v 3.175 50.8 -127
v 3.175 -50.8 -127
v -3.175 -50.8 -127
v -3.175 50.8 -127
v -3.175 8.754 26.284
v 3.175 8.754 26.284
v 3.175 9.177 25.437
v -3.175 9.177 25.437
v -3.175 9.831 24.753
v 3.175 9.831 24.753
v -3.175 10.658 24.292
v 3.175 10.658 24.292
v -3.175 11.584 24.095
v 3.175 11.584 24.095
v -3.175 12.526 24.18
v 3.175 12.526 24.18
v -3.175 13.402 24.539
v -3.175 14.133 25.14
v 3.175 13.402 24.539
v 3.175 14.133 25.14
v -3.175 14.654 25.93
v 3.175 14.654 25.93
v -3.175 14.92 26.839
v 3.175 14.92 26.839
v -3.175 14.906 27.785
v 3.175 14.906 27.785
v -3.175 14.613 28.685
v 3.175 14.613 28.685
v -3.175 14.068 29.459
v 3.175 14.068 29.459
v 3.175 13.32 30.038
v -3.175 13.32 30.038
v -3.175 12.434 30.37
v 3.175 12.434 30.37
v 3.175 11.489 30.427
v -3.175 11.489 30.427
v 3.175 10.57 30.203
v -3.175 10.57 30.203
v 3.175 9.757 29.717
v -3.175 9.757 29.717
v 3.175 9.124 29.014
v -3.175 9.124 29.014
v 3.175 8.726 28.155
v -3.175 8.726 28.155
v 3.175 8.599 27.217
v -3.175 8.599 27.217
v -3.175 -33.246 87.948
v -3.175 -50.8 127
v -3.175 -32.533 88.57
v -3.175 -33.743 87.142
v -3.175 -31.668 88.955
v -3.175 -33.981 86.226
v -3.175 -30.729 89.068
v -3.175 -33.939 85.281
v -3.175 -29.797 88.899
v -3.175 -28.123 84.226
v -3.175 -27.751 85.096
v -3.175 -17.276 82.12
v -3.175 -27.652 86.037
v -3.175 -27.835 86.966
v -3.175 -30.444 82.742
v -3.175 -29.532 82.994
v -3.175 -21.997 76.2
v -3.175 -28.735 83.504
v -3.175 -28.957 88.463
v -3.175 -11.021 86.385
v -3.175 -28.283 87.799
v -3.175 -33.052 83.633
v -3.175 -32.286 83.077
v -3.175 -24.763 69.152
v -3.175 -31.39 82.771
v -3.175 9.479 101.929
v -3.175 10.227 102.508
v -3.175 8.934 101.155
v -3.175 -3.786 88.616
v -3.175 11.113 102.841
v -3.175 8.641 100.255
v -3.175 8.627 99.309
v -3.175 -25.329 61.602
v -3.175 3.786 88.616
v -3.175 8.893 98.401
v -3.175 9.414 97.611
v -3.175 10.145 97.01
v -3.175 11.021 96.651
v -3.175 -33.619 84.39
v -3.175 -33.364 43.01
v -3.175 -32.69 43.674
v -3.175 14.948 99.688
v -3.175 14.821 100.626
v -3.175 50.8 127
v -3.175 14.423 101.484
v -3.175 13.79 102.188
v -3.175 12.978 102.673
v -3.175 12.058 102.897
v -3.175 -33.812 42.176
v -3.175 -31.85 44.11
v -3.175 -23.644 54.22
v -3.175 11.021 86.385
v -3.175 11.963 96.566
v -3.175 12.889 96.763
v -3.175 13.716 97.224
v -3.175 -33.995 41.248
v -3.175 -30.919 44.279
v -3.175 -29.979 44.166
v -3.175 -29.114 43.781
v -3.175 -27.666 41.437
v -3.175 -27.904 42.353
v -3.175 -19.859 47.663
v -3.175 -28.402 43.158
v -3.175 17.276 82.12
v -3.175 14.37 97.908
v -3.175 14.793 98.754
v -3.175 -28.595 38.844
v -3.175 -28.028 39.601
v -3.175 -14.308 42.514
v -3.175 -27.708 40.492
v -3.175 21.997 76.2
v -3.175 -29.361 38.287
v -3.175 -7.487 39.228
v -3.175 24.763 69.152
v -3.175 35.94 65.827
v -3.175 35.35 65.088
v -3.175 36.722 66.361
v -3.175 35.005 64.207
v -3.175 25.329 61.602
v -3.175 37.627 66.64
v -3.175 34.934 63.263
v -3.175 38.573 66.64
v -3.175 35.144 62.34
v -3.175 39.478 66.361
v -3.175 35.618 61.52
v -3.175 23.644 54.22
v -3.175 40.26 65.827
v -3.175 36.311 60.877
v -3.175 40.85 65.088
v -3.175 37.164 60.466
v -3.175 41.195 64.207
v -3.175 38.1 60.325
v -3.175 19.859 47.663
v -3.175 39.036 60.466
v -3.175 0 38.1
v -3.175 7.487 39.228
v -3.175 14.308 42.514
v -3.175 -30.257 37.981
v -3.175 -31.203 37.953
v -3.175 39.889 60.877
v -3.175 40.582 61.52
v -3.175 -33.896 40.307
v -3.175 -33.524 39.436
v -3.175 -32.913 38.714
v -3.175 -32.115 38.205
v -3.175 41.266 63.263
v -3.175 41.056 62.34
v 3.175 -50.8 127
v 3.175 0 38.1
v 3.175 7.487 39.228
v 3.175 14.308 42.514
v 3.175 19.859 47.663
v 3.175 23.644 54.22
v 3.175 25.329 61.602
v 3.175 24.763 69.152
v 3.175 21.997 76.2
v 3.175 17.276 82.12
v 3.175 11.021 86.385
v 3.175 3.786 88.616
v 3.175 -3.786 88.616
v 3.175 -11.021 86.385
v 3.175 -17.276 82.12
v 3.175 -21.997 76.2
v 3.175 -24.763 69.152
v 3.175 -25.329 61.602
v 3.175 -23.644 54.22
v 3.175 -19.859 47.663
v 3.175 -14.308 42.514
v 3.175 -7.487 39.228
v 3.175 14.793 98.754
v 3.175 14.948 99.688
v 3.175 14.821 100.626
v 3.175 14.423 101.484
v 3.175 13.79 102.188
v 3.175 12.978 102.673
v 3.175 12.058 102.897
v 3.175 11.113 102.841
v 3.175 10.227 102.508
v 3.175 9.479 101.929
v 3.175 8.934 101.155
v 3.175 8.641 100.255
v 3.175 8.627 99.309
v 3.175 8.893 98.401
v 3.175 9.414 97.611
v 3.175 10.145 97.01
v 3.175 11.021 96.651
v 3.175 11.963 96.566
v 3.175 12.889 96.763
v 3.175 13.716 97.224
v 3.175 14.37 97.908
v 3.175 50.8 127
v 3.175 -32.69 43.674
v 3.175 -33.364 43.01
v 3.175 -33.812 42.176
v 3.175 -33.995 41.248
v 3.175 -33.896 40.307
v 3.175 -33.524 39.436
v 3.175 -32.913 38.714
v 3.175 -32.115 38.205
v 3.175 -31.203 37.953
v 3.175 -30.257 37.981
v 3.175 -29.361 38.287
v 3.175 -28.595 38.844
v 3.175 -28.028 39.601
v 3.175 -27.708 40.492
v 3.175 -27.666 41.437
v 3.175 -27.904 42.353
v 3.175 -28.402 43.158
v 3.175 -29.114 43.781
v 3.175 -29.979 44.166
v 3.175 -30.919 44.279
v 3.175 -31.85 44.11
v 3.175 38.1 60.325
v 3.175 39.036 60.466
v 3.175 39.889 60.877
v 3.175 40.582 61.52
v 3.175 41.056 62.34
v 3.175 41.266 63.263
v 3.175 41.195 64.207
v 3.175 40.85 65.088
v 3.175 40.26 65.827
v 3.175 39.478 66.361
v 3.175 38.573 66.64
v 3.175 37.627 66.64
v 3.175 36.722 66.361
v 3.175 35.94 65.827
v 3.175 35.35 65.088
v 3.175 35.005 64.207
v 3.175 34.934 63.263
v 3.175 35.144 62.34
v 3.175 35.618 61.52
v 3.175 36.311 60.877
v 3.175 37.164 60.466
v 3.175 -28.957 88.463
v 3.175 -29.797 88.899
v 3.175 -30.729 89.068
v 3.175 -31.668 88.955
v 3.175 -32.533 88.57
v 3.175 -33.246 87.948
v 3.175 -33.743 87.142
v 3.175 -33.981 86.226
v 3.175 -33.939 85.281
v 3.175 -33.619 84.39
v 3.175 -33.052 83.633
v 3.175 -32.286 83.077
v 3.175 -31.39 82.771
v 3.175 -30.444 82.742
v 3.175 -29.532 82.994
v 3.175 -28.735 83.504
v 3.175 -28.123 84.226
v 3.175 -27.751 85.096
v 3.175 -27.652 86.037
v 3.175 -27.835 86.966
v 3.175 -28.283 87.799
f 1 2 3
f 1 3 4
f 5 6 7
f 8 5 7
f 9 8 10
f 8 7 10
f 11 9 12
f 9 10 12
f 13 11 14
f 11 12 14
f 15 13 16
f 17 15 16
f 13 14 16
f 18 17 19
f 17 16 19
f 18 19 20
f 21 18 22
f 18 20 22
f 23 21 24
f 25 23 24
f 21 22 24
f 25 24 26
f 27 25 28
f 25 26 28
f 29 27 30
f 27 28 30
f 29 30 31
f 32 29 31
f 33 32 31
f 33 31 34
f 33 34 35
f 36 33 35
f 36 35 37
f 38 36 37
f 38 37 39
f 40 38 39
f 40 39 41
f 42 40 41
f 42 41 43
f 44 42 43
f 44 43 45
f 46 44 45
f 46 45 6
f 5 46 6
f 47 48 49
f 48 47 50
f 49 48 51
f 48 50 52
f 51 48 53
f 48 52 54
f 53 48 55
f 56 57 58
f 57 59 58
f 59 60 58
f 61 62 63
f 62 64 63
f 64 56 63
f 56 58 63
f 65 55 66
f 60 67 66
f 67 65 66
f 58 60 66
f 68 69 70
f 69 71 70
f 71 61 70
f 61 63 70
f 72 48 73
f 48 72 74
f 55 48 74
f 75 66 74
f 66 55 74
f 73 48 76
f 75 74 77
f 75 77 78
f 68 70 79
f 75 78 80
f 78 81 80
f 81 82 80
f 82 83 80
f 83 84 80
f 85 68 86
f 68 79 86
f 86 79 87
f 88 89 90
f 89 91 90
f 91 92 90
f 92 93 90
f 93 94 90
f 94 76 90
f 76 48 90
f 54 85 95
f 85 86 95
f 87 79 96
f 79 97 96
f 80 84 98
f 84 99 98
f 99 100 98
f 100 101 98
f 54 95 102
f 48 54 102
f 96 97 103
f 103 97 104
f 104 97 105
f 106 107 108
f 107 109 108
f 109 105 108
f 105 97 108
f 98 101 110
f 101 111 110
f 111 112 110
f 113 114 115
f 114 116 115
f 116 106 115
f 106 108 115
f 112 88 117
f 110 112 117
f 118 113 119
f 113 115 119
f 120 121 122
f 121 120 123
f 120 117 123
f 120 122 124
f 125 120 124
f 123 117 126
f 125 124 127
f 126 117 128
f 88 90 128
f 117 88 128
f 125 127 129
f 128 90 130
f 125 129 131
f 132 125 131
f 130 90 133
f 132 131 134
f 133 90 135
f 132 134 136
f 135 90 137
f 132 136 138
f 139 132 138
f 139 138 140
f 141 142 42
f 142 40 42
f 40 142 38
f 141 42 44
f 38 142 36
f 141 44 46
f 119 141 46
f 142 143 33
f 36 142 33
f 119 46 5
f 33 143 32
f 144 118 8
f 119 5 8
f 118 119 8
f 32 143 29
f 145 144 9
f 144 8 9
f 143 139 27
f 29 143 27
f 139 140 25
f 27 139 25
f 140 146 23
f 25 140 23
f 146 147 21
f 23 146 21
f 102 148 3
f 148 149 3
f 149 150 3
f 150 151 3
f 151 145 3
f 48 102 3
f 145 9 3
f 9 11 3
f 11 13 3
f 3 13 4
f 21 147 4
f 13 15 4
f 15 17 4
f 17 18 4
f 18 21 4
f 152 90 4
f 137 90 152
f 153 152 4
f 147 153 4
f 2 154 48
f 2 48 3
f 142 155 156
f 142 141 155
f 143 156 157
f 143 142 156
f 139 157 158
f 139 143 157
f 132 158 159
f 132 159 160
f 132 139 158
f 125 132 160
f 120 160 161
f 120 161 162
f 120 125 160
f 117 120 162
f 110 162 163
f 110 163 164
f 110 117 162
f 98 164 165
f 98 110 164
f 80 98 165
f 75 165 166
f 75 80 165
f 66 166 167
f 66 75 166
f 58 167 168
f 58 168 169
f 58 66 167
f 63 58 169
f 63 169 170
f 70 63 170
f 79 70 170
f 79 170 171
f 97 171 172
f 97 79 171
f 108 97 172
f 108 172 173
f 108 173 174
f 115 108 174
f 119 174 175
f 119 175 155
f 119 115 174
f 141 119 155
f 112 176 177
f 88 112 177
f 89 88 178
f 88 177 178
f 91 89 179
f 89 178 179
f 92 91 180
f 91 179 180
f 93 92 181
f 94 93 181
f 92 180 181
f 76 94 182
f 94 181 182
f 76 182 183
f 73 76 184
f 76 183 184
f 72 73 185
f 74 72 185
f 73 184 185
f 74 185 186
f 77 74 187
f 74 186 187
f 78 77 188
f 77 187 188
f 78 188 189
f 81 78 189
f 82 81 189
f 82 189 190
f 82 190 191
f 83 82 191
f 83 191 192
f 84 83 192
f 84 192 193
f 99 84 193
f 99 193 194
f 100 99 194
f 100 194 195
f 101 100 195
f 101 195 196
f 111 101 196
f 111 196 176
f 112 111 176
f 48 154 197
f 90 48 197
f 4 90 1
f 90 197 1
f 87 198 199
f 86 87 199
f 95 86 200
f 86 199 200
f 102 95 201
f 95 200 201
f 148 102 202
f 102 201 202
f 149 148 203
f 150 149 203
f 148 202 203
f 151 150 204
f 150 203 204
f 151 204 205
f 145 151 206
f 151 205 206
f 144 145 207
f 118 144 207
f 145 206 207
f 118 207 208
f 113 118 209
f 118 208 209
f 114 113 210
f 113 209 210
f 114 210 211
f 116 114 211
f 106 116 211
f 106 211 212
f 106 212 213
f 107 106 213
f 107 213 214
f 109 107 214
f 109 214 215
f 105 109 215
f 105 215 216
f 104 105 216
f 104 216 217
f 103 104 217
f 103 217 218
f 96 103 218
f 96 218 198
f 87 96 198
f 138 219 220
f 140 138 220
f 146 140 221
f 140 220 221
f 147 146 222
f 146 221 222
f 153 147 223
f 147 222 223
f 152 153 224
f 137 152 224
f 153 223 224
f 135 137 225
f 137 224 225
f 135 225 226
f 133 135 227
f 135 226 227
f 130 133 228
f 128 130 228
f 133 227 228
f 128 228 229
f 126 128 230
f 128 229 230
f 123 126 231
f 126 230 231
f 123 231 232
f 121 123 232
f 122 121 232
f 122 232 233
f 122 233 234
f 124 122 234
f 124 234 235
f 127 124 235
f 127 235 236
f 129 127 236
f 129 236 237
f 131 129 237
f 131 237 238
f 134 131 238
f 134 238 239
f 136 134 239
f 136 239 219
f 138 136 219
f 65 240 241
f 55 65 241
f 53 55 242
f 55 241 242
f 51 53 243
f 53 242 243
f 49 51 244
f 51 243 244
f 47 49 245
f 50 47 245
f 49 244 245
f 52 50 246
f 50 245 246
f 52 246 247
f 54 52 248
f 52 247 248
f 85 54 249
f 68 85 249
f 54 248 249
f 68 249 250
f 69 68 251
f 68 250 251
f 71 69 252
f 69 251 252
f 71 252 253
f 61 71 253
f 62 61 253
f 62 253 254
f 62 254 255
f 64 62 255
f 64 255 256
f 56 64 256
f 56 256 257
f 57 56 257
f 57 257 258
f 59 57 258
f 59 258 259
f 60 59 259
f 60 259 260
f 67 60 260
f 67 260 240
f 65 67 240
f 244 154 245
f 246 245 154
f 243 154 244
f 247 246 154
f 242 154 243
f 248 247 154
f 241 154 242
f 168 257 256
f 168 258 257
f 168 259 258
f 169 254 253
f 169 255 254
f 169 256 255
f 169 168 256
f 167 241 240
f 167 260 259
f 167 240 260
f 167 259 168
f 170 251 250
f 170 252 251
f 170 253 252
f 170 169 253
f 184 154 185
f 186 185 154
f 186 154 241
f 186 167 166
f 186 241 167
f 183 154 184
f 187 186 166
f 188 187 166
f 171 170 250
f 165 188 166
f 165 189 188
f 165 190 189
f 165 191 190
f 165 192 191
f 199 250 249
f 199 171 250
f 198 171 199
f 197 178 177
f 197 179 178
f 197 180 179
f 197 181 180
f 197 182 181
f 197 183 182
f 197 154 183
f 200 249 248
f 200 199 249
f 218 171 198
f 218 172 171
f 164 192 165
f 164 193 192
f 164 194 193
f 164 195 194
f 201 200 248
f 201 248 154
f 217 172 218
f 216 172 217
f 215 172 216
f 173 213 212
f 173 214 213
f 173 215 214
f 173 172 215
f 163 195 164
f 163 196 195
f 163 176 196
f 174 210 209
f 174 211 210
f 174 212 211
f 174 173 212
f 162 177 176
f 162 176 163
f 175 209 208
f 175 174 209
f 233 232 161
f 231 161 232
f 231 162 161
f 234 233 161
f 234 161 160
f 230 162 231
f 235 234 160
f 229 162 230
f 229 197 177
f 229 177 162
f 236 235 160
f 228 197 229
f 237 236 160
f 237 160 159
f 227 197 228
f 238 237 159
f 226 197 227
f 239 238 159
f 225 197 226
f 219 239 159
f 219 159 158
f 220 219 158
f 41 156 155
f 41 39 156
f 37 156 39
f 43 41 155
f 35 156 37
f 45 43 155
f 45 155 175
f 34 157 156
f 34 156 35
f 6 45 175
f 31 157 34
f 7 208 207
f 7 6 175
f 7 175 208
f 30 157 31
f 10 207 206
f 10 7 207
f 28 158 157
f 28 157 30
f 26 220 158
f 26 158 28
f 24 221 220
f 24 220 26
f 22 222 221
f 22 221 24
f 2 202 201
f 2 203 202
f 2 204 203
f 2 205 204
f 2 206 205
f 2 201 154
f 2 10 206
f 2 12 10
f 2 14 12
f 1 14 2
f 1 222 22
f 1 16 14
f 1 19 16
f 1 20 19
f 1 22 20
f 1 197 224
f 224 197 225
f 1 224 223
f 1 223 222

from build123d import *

# Parameters (mm, degrees)
SKETCH1_W           = 254
SKETCH1_H           = 101.6
SKETCH1_R           = 25.4
BOSS_EXTRUDE1_DEPTH = 3.175
SKETCH2_R           = 3.175
CUT_EXTRUDE1_DEPTH  = 7.35
CIRPATTERN1_COUNT   = 5


with BuildPart() as part:
    # Sketch1 → Boss-Extrude1 (new body, symmetric)
    with BuildSketch(Plane(origin=(0, 0, 0), x_dir=(0, 0, -1), z_dir=(1, 0, 0))):
        Rectangle(SKETCH1_W, SKETCH1_H)
        with Locations((-63.5, 0)):
            Circle(SKETCH1_R, mode=Mode.SUBTRACT)
    extrude(amount=BOSS_EXTRUDE1_DEPTH, both=True)

    # Sketch2 → Cut-Extrude1 (cut, through all)
    with BuildSketch(Plane(origin=(3.175, 0, 0), x_dir=(0, 0, -1), z_dir=(1, 0, 0))):
        with Locations((-63.5, 38.1)):
            Circle(SKETCH2_R)
    cut_extrude1 = extrude(amount=-CUT_EXTRUDE1_DEPTH, mode=Mode.SUBTRACT)

    # CirPattern1: Cut-Extrude1 ×5 about axis
    cirpattern1_axis = Axis((0, 0, 63.5), (1, 0, 0))
    for i in range(1, CIRPATTERN1_COUNT):
        add(cut_extrude1.rotate(cirpattern1_axis, i * 360 / CIRPATTERN1_COUNT), mode=Mode.SUBTRACT)


solid = part.part
